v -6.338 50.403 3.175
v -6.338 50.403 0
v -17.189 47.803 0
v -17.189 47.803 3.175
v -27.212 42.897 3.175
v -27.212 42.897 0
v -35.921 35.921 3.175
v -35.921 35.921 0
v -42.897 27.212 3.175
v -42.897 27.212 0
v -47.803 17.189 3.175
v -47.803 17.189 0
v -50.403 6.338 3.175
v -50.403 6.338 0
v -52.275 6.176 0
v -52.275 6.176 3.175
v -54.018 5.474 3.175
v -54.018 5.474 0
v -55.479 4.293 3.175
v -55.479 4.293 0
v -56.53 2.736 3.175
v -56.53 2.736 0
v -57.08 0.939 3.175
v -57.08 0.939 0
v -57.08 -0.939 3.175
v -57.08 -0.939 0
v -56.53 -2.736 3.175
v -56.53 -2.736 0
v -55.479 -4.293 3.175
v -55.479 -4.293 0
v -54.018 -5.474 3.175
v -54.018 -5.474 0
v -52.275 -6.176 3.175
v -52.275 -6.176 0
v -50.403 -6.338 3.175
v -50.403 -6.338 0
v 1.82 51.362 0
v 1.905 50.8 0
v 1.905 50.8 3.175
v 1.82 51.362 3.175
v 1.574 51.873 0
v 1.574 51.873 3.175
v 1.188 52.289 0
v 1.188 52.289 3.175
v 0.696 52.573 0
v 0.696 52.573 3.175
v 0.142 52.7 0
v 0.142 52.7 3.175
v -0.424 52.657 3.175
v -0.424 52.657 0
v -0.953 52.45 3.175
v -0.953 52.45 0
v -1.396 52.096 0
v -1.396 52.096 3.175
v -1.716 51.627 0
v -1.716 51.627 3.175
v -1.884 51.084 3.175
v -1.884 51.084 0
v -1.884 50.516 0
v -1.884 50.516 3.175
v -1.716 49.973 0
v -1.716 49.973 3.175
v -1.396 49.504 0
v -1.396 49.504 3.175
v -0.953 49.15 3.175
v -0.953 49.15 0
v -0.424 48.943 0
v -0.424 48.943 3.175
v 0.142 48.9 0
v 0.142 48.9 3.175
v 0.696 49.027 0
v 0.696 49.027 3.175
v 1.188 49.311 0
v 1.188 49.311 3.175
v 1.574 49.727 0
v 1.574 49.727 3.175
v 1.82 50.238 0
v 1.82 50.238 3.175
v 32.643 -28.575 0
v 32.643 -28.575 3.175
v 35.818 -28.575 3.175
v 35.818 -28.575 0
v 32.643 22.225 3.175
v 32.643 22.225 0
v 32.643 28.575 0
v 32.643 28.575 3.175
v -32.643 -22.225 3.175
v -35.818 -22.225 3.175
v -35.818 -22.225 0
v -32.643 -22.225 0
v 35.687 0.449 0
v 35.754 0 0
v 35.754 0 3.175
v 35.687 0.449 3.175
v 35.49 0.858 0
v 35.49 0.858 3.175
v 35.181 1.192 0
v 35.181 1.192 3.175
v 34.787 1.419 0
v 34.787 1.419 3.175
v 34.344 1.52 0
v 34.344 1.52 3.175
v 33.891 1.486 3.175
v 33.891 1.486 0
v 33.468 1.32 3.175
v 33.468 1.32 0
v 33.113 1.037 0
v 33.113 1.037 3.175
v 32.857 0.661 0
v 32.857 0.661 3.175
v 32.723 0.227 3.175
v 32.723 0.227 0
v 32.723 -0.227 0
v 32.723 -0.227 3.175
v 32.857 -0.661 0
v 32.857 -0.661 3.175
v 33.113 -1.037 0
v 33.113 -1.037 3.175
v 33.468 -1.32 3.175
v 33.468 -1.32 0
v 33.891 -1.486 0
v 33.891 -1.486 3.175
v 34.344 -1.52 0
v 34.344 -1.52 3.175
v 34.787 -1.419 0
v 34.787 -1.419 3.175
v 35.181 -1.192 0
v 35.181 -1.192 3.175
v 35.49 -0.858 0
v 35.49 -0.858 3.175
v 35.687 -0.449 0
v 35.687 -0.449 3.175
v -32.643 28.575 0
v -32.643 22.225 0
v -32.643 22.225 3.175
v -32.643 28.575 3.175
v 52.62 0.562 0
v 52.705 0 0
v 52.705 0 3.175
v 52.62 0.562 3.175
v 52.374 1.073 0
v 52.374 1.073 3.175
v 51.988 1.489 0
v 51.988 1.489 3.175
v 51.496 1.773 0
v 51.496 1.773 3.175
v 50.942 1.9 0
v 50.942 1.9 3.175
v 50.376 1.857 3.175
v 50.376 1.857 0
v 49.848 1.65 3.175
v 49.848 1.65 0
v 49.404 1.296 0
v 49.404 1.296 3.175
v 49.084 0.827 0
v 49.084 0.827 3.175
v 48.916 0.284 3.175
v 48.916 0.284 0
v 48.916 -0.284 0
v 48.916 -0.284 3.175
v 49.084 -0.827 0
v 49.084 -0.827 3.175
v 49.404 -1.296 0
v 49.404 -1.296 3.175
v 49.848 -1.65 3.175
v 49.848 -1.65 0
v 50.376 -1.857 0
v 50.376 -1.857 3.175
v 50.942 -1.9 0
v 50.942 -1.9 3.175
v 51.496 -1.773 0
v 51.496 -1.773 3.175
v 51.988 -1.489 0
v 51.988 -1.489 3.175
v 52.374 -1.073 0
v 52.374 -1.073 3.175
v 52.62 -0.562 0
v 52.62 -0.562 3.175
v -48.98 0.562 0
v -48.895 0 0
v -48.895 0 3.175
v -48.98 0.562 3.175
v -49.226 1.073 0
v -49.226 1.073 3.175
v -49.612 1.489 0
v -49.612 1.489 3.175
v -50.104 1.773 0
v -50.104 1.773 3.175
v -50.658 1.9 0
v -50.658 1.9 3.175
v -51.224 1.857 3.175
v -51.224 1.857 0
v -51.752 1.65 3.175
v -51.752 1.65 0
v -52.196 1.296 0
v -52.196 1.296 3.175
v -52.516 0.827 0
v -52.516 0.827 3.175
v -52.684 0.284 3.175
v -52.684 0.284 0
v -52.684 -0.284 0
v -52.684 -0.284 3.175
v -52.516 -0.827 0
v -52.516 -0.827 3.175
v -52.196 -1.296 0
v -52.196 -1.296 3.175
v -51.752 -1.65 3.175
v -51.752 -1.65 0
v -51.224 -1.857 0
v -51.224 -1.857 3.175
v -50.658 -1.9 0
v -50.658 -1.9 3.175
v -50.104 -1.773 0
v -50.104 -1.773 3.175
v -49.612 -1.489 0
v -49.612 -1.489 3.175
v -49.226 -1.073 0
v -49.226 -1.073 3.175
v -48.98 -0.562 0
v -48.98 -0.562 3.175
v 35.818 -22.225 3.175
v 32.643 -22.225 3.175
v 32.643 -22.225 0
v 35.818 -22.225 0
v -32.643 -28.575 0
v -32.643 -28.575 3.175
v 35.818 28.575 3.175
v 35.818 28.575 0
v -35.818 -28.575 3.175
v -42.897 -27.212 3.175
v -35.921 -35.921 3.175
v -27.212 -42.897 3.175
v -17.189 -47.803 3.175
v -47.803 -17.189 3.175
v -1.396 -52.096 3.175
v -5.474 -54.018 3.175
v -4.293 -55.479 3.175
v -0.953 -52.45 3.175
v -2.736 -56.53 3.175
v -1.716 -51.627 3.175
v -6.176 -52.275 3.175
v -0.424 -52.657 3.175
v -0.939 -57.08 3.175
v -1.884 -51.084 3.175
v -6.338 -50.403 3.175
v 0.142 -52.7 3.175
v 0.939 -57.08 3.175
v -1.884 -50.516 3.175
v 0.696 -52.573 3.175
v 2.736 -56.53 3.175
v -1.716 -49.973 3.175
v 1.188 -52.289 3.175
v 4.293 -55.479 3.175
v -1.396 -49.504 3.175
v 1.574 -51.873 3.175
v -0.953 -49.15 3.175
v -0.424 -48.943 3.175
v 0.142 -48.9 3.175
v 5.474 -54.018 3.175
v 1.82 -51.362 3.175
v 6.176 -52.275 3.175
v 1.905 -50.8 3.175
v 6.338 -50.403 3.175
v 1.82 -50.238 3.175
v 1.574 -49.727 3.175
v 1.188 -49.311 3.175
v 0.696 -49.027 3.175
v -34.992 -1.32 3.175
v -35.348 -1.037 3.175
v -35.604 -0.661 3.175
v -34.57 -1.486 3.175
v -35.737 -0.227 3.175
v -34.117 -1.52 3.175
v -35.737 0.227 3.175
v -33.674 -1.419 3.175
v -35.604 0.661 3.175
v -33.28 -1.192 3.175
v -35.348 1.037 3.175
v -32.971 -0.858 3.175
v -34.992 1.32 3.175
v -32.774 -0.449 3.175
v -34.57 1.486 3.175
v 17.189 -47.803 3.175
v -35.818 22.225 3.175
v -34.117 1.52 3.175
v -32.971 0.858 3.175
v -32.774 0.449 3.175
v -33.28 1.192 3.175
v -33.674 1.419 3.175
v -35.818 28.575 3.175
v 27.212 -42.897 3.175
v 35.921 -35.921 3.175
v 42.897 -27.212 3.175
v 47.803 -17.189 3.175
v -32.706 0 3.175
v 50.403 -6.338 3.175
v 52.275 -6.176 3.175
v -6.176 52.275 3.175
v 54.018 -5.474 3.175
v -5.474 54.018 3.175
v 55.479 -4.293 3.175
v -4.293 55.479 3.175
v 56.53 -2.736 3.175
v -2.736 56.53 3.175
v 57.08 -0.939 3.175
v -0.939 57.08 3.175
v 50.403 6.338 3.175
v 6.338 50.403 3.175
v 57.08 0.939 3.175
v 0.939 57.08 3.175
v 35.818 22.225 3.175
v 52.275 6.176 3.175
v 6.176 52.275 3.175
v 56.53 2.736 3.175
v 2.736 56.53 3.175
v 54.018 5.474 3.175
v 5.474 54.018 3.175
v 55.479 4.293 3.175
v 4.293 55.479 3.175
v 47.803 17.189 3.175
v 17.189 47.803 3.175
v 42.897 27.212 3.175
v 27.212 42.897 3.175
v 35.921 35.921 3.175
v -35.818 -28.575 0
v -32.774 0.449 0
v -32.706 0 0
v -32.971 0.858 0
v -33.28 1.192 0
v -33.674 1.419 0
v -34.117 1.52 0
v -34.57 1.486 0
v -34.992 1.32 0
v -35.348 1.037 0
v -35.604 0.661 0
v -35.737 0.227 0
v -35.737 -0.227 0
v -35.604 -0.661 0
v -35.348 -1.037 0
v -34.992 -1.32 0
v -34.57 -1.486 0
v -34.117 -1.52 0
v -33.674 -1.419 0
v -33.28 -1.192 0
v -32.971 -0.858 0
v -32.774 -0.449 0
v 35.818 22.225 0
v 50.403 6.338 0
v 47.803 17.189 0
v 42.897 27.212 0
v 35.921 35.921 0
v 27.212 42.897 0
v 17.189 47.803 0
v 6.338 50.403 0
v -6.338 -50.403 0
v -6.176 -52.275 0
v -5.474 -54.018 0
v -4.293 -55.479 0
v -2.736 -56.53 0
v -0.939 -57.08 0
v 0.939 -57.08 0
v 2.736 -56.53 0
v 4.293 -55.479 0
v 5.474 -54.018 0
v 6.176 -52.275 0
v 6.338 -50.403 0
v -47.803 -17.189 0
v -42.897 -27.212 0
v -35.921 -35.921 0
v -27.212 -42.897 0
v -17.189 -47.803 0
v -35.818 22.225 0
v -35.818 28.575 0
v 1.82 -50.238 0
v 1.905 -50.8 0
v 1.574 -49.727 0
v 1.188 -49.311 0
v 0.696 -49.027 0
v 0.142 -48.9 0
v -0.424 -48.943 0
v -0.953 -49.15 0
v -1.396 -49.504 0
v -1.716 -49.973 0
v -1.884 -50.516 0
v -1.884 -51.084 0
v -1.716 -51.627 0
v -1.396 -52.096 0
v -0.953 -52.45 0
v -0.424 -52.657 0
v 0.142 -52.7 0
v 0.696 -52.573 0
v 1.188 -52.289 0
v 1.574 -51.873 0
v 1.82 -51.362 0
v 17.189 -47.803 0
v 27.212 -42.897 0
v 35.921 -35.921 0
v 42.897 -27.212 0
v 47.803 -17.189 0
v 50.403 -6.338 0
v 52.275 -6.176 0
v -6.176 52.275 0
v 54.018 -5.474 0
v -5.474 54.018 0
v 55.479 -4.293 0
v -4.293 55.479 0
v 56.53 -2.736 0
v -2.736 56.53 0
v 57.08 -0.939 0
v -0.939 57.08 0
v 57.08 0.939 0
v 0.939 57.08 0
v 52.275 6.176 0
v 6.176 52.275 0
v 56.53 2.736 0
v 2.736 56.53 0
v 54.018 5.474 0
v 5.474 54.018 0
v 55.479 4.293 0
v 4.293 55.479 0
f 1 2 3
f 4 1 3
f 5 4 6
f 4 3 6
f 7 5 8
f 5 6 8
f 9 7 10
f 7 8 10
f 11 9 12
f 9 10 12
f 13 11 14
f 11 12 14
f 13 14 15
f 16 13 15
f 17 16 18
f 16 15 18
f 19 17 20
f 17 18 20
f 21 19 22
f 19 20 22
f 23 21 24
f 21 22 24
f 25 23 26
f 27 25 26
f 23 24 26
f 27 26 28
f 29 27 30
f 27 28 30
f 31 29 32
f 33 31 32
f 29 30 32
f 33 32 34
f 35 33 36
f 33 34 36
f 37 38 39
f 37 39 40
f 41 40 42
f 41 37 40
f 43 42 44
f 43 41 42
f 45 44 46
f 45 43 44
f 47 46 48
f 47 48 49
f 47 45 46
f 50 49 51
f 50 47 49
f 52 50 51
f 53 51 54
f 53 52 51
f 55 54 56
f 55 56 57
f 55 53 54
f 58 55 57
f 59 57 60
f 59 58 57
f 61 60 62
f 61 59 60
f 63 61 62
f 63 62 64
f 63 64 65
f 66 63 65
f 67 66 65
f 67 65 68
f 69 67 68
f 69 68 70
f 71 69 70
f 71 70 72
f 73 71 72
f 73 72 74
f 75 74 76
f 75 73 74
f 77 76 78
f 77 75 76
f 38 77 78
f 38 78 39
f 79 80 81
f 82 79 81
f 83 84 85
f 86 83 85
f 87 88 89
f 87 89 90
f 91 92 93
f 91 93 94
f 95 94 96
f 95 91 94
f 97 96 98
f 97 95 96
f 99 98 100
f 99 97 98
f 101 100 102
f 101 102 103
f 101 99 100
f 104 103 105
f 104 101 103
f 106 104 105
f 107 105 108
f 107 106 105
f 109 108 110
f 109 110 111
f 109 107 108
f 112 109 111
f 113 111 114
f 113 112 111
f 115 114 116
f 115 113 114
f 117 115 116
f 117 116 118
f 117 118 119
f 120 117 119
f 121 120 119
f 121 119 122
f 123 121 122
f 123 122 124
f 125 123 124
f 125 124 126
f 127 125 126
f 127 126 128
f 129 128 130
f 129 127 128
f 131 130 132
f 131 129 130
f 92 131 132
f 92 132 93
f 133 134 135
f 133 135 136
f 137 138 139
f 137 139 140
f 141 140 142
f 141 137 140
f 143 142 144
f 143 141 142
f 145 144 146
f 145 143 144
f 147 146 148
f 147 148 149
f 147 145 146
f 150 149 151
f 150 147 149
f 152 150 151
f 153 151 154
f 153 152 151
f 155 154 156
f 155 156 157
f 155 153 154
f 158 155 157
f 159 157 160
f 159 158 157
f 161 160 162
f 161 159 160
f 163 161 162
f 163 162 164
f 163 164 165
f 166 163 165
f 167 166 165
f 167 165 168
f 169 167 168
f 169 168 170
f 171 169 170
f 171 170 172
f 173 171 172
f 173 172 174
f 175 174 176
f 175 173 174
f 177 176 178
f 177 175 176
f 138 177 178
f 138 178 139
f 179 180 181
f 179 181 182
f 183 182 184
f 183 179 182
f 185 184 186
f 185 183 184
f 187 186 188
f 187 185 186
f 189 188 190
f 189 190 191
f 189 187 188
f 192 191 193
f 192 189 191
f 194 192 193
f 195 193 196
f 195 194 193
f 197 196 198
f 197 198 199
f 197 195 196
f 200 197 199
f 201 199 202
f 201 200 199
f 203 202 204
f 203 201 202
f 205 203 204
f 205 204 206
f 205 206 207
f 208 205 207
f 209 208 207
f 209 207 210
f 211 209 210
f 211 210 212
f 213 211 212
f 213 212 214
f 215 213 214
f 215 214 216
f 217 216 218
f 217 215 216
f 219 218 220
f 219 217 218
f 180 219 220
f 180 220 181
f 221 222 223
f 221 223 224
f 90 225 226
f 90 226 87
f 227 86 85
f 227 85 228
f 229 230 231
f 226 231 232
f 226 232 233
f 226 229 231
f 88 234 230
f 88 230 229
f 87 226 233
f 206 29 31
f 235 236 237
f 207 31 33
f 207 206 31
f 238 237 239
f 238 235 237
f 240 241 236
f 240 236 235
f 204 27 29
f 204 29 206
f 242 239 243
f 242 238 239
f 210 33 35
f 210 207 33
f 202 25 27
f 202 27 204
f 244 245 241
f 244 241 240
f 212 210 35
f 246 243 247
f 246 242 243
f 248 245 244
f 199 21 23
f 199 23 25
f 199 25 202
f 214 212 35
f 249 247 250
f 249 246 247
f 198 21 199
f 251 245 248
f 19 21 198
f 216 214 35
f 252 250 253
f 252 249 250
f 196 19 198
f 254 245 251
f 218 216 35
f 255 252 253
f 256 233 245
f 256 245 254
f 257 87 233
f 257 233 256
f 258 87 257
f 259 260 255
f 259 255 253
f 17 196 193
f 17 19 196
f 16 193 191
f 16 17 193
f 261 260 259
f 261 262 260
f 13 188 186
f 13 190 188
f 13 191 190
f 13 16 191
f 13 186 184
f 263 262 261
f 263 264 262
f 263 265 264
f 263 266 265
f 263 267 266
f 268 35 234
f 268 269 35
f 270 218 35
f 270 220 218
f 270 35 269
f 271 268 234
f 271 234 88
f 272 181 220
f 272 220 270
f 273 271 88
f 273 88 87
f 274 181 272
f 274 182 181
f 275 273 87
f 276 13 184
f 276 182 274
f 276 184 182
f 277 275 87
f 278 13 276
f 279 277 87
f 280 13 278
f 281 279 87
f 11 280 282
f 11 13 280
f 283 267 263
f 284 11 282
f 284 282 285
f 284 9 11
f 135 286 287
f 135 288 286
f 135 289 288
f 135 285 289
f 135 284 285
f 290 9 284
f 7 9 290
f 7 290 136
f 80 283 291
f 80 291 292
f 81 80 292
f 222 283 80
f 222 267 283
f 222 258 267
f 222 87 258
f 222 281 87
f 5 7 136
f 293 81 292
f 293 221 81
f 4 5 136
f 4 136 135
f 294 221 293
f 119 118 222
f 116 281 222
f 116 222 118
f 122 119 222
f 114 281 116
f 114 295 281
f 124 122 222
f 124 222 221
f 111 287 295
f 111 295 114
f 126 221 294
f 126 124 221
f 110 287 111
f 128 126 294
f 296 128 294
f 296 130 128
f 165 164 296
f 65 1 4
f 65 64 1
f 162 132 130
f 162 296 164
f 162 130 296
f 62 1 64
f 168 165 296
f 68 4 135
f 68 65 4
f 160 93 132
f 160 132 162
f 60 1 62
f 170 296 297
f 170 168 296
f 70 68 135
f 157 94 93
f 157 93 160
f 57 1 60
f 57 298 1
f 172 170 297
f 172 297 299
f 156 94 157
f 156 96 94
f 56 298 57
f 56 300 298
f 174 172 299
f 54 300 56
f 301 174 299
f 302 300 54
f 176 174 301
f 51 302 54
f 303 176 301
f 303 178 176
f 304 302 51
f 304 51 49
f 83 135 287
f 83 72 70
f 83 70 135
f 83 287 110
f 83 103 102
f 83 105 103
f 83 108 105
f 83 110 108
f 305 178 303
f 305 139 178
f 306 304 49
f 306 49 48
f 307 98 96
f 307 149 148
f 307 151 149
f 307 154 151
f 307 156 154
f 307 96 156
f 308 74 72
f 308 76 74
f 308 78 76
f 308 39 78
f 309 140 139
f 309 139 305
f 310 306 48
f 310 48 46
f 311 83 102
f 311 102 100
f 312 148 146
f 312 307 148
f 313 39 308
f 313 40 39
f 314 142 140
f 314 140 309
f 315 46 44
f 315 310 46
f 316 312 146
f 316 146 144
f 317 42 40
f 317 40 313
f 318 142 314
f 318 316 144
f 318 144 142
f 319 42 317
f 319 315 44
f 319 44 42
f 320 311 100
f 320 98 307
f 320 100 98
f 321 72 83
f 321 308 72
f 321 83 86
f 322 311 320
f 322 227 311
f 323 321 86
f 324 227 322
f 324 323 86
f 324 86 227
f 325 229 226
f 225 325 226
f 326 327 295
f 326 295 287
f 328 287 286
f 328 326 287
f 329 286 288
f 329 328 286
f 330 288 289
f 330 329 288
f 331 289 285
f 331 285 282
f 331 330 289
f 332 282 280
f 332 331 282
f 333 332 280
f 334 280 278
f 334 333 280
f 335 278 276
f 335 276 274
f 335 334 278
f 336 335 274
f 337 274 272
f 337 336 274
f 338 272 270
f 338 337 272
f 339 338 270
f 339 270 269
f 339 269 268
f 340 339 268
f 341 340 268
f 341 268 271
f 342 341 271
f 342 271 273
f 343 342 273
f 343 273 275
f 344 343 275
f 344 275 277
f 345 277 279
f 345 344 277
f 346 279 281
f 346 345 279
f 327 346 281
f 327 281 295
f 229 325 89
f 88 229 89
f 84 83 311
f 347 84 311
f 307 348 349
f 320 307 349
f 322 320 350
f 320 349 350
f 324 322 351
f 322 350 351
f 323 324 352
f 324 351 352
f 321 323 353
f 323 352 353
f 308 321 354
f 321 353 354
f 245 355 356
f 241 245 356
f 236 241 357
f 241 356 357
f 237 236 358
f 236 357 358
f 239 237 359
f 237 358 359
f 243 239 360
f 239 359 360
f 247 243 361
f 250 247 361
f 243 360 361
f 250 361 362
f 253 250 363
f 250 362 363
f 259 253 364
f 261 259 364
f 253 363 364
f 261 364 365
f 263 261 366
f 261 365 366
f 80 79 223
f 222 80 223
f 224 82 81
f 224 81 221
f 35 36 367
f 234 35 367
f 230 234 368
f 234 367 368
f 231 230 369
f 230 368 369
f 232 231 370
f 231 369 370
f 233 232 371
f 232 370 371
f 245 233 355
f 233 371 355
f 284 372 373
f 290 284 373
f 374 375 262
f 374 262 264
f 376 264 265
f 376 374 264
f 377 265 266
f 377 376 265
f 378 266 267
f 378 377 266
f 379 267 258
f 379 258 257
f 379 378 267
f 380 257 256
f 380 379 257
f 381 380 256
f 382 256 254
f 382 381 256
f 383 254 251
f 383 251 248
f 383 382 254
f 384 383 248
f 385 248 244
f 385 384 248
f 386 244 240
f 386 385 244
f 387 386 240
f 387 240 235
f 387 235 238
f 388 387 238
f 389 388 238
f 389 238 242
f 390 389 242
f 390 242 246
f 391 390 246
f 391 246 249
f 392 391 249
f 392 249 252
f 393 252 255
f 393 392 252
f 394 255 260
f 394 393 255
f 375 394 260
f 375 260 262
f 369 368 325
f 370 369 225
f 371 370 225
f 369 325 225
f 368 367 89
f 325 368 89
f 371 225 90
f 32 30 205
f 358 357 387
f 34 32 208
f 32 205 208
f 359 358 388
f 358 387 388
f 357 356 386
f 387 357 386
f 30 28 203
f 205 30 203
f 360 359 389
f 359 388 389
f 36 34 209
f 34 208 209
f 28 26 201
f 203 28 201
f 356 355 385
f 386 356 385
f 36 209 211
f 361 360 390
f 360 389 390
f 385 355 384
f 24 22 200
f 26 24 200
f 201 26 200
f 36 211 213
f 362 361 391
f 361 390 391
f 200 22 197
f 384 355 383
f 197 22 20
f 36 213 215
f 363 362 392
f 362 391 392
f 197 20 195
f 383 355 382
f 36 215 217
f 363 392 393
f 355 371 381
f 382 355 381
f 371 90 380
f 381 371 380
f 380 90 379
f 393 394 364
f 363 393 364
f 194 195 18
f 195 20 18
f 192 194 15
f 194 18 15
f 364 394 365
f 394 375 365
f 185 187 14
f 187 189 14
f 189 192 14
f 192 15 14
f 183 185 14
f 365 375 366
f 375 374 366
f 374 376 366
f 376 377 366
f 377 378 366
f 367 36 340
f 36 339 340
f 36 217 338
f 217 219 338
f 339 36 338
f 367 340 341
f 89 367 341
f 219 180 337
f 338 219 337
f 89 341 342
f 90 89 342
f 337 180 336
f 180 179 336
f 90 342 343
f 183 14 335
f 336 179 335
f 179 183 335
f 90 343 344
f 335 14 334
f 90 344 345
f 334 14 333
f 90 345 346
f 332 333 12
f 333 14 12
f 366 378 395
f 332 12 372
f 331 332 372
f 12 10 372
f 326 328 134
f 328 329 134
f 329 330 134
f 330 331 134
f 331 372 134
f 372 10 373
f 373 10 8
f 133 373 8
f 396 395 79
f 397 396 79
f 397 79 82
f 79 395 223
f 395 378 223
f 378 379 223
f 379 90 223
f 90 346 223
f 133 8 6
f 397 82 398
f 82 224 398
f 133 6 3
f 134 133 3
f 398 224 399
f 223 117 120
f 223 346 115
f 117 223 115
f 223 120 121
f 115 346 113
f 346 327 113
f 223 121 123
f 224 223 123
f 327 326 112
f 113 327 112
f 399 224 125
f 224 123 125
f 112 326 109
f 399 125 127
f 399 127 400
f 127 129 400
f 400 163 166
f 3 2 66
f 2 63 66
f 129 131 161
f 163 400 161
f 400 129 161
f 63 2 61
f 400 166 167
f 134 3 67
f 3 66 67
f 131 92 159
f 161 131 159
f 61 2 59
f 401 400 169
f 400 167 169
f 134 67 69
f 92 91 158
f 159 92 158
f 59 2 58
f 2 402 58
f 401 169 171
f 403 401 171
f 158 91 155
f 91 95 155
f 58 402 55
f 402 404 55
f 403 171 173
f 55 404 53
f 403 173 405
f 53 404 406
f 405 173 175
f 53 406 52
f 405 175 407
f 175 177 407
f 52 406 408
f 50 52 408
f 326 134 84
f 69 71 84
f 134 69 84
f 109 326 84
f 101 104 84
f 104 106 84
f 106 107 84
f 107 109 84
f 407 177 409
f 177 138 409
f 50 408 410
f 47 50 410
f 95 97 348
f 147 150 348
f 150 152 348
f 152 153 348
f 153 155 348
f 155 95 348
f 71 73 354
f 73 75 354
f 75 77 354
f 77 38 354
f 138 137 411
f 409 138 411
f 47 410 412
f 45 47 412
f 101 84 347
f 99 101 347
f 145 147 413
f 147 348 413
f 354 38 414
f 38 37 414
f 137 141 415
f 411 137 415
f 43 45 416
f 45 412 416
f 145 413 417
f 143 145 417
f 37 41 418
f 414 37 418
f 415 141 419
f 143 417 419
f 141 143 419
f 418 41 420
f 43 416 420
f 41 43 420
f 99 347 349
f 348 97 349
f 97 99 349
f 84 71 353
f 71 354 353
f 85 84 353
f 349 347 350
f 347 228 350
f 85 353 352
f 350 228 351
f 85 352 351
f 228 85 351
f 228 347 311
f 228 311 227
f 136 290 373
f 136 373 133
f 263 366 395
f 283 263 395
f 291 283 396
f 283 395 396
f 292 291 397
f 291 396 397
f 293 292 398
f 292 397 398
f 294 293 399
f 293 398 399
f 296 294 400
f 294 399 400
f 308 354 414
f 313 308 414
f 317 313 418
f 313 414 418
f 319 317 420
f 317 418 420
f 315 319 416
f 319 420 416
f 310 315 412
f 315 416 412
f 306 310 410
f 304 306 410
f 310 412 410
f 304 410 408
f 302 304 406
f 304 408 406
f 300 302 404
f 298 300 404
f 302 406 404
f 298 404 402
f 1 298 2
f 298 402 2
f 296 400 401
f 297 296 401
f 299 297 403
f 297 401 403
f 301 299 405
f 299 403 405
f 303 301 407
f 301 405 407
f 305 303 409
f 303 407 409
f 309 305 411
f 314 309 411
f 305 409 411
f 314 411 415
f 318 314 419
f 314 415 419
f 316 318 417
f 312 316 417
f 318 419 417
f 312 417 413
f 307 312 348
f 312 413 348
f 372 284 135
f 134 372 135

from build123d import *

# Parameters (mm, degrees)
F0_W     = 3.175
F0_H     = 6.35
F0_R     = 1.905
F0_R_2   = 1.524
F1_DEPTH = 3.175


# Not quite as in the source:
# - a length typed as a fraction of an inch, garbled in the dataset ("3 / 203.2 mm" for 3/8 in), is restored


with BuildPart() as f1:
    # F0 (on Top) → F1 (new body)
    with BuildSketch(Plane.XY):
        with BuildLine():
            ThreePointArc((-50.403125, 6.3375855209), (-57.15, 0), (-50.403125, -6.3375855209))
            ThreePointArc((-50.403125, -6.3375855209), (-35.9210244843, -35.9210244843), (-6.3375855209, -50.403125))
            ThreePointArc((-6.3375855209, -50.403125), (0, -57.15), (6.3375855209, -50.403125))
            ThreePointArc((6.3375855209, -50.403125), (35.9210244843, -35.9210244843), (50.403125, -6.3375855209))
            ThreePointArc((50.403125, -6.3375855209), (57.15, 0), (50.403125, 6.3375855209))
            ThreePointArc((50.403125, 6.3375855209), (35.9210244843, 35.9210244843), (6.3375855209, 50.403125))
            ThreePointArc((6.3375855209, 50.403125), (0, 57.15), (-6.3375855209, 50.403125))
            ThreePointArc((-6.3375855209, 50.403125), (-35.9210244843, 35.9210244843), (-50.403125, 6.3375855209))
        make_face()
        with Locations((-34.2304483056, -25.4)):
            Rectangle(F0_W, F0_H, mode=Mode.SUBTRACT)
        with Locations((0, -50.8)):
            Circle(F0_R, mode=Mode.SUBTRACT)
        with Locations((34.2304483056, -25.4)):
            Rectangle(F0_W, F0_H, mode=Mode.SUBTRACT)
        with Locations((-50.8, 0)):
            Circle(F0_R, mode=Mode.SUBTRACT)
        with Locations((-34.2304483056, 0)):
            Circle(F0_R_2, mode=Mode.SUBTRACT)
        with Locations((-34.2304483056, 25.4)):
            Rectangle(F0_W, F0_H, mode=Mode.SUBTRACT)
        with Locations((34.2304483056, 0)):
            Circle(F0_R_2, mode=Mode.SUBTRACT)
        with Locations((50.8, 0)):
            Circle(F0_R, mode=Mode.SUBTRACT)
        with Locations((34.2304483056, 25.4)):
            Rectangle(F0_W, F0_H, mode=Mode.SUBTRACT)
        with Locations((0, 50.8)):
            Circle(F0_R, mode=Mode.SUBTRACT)
    extrude(amount=F1_DEPTH)


solid = f1.part
